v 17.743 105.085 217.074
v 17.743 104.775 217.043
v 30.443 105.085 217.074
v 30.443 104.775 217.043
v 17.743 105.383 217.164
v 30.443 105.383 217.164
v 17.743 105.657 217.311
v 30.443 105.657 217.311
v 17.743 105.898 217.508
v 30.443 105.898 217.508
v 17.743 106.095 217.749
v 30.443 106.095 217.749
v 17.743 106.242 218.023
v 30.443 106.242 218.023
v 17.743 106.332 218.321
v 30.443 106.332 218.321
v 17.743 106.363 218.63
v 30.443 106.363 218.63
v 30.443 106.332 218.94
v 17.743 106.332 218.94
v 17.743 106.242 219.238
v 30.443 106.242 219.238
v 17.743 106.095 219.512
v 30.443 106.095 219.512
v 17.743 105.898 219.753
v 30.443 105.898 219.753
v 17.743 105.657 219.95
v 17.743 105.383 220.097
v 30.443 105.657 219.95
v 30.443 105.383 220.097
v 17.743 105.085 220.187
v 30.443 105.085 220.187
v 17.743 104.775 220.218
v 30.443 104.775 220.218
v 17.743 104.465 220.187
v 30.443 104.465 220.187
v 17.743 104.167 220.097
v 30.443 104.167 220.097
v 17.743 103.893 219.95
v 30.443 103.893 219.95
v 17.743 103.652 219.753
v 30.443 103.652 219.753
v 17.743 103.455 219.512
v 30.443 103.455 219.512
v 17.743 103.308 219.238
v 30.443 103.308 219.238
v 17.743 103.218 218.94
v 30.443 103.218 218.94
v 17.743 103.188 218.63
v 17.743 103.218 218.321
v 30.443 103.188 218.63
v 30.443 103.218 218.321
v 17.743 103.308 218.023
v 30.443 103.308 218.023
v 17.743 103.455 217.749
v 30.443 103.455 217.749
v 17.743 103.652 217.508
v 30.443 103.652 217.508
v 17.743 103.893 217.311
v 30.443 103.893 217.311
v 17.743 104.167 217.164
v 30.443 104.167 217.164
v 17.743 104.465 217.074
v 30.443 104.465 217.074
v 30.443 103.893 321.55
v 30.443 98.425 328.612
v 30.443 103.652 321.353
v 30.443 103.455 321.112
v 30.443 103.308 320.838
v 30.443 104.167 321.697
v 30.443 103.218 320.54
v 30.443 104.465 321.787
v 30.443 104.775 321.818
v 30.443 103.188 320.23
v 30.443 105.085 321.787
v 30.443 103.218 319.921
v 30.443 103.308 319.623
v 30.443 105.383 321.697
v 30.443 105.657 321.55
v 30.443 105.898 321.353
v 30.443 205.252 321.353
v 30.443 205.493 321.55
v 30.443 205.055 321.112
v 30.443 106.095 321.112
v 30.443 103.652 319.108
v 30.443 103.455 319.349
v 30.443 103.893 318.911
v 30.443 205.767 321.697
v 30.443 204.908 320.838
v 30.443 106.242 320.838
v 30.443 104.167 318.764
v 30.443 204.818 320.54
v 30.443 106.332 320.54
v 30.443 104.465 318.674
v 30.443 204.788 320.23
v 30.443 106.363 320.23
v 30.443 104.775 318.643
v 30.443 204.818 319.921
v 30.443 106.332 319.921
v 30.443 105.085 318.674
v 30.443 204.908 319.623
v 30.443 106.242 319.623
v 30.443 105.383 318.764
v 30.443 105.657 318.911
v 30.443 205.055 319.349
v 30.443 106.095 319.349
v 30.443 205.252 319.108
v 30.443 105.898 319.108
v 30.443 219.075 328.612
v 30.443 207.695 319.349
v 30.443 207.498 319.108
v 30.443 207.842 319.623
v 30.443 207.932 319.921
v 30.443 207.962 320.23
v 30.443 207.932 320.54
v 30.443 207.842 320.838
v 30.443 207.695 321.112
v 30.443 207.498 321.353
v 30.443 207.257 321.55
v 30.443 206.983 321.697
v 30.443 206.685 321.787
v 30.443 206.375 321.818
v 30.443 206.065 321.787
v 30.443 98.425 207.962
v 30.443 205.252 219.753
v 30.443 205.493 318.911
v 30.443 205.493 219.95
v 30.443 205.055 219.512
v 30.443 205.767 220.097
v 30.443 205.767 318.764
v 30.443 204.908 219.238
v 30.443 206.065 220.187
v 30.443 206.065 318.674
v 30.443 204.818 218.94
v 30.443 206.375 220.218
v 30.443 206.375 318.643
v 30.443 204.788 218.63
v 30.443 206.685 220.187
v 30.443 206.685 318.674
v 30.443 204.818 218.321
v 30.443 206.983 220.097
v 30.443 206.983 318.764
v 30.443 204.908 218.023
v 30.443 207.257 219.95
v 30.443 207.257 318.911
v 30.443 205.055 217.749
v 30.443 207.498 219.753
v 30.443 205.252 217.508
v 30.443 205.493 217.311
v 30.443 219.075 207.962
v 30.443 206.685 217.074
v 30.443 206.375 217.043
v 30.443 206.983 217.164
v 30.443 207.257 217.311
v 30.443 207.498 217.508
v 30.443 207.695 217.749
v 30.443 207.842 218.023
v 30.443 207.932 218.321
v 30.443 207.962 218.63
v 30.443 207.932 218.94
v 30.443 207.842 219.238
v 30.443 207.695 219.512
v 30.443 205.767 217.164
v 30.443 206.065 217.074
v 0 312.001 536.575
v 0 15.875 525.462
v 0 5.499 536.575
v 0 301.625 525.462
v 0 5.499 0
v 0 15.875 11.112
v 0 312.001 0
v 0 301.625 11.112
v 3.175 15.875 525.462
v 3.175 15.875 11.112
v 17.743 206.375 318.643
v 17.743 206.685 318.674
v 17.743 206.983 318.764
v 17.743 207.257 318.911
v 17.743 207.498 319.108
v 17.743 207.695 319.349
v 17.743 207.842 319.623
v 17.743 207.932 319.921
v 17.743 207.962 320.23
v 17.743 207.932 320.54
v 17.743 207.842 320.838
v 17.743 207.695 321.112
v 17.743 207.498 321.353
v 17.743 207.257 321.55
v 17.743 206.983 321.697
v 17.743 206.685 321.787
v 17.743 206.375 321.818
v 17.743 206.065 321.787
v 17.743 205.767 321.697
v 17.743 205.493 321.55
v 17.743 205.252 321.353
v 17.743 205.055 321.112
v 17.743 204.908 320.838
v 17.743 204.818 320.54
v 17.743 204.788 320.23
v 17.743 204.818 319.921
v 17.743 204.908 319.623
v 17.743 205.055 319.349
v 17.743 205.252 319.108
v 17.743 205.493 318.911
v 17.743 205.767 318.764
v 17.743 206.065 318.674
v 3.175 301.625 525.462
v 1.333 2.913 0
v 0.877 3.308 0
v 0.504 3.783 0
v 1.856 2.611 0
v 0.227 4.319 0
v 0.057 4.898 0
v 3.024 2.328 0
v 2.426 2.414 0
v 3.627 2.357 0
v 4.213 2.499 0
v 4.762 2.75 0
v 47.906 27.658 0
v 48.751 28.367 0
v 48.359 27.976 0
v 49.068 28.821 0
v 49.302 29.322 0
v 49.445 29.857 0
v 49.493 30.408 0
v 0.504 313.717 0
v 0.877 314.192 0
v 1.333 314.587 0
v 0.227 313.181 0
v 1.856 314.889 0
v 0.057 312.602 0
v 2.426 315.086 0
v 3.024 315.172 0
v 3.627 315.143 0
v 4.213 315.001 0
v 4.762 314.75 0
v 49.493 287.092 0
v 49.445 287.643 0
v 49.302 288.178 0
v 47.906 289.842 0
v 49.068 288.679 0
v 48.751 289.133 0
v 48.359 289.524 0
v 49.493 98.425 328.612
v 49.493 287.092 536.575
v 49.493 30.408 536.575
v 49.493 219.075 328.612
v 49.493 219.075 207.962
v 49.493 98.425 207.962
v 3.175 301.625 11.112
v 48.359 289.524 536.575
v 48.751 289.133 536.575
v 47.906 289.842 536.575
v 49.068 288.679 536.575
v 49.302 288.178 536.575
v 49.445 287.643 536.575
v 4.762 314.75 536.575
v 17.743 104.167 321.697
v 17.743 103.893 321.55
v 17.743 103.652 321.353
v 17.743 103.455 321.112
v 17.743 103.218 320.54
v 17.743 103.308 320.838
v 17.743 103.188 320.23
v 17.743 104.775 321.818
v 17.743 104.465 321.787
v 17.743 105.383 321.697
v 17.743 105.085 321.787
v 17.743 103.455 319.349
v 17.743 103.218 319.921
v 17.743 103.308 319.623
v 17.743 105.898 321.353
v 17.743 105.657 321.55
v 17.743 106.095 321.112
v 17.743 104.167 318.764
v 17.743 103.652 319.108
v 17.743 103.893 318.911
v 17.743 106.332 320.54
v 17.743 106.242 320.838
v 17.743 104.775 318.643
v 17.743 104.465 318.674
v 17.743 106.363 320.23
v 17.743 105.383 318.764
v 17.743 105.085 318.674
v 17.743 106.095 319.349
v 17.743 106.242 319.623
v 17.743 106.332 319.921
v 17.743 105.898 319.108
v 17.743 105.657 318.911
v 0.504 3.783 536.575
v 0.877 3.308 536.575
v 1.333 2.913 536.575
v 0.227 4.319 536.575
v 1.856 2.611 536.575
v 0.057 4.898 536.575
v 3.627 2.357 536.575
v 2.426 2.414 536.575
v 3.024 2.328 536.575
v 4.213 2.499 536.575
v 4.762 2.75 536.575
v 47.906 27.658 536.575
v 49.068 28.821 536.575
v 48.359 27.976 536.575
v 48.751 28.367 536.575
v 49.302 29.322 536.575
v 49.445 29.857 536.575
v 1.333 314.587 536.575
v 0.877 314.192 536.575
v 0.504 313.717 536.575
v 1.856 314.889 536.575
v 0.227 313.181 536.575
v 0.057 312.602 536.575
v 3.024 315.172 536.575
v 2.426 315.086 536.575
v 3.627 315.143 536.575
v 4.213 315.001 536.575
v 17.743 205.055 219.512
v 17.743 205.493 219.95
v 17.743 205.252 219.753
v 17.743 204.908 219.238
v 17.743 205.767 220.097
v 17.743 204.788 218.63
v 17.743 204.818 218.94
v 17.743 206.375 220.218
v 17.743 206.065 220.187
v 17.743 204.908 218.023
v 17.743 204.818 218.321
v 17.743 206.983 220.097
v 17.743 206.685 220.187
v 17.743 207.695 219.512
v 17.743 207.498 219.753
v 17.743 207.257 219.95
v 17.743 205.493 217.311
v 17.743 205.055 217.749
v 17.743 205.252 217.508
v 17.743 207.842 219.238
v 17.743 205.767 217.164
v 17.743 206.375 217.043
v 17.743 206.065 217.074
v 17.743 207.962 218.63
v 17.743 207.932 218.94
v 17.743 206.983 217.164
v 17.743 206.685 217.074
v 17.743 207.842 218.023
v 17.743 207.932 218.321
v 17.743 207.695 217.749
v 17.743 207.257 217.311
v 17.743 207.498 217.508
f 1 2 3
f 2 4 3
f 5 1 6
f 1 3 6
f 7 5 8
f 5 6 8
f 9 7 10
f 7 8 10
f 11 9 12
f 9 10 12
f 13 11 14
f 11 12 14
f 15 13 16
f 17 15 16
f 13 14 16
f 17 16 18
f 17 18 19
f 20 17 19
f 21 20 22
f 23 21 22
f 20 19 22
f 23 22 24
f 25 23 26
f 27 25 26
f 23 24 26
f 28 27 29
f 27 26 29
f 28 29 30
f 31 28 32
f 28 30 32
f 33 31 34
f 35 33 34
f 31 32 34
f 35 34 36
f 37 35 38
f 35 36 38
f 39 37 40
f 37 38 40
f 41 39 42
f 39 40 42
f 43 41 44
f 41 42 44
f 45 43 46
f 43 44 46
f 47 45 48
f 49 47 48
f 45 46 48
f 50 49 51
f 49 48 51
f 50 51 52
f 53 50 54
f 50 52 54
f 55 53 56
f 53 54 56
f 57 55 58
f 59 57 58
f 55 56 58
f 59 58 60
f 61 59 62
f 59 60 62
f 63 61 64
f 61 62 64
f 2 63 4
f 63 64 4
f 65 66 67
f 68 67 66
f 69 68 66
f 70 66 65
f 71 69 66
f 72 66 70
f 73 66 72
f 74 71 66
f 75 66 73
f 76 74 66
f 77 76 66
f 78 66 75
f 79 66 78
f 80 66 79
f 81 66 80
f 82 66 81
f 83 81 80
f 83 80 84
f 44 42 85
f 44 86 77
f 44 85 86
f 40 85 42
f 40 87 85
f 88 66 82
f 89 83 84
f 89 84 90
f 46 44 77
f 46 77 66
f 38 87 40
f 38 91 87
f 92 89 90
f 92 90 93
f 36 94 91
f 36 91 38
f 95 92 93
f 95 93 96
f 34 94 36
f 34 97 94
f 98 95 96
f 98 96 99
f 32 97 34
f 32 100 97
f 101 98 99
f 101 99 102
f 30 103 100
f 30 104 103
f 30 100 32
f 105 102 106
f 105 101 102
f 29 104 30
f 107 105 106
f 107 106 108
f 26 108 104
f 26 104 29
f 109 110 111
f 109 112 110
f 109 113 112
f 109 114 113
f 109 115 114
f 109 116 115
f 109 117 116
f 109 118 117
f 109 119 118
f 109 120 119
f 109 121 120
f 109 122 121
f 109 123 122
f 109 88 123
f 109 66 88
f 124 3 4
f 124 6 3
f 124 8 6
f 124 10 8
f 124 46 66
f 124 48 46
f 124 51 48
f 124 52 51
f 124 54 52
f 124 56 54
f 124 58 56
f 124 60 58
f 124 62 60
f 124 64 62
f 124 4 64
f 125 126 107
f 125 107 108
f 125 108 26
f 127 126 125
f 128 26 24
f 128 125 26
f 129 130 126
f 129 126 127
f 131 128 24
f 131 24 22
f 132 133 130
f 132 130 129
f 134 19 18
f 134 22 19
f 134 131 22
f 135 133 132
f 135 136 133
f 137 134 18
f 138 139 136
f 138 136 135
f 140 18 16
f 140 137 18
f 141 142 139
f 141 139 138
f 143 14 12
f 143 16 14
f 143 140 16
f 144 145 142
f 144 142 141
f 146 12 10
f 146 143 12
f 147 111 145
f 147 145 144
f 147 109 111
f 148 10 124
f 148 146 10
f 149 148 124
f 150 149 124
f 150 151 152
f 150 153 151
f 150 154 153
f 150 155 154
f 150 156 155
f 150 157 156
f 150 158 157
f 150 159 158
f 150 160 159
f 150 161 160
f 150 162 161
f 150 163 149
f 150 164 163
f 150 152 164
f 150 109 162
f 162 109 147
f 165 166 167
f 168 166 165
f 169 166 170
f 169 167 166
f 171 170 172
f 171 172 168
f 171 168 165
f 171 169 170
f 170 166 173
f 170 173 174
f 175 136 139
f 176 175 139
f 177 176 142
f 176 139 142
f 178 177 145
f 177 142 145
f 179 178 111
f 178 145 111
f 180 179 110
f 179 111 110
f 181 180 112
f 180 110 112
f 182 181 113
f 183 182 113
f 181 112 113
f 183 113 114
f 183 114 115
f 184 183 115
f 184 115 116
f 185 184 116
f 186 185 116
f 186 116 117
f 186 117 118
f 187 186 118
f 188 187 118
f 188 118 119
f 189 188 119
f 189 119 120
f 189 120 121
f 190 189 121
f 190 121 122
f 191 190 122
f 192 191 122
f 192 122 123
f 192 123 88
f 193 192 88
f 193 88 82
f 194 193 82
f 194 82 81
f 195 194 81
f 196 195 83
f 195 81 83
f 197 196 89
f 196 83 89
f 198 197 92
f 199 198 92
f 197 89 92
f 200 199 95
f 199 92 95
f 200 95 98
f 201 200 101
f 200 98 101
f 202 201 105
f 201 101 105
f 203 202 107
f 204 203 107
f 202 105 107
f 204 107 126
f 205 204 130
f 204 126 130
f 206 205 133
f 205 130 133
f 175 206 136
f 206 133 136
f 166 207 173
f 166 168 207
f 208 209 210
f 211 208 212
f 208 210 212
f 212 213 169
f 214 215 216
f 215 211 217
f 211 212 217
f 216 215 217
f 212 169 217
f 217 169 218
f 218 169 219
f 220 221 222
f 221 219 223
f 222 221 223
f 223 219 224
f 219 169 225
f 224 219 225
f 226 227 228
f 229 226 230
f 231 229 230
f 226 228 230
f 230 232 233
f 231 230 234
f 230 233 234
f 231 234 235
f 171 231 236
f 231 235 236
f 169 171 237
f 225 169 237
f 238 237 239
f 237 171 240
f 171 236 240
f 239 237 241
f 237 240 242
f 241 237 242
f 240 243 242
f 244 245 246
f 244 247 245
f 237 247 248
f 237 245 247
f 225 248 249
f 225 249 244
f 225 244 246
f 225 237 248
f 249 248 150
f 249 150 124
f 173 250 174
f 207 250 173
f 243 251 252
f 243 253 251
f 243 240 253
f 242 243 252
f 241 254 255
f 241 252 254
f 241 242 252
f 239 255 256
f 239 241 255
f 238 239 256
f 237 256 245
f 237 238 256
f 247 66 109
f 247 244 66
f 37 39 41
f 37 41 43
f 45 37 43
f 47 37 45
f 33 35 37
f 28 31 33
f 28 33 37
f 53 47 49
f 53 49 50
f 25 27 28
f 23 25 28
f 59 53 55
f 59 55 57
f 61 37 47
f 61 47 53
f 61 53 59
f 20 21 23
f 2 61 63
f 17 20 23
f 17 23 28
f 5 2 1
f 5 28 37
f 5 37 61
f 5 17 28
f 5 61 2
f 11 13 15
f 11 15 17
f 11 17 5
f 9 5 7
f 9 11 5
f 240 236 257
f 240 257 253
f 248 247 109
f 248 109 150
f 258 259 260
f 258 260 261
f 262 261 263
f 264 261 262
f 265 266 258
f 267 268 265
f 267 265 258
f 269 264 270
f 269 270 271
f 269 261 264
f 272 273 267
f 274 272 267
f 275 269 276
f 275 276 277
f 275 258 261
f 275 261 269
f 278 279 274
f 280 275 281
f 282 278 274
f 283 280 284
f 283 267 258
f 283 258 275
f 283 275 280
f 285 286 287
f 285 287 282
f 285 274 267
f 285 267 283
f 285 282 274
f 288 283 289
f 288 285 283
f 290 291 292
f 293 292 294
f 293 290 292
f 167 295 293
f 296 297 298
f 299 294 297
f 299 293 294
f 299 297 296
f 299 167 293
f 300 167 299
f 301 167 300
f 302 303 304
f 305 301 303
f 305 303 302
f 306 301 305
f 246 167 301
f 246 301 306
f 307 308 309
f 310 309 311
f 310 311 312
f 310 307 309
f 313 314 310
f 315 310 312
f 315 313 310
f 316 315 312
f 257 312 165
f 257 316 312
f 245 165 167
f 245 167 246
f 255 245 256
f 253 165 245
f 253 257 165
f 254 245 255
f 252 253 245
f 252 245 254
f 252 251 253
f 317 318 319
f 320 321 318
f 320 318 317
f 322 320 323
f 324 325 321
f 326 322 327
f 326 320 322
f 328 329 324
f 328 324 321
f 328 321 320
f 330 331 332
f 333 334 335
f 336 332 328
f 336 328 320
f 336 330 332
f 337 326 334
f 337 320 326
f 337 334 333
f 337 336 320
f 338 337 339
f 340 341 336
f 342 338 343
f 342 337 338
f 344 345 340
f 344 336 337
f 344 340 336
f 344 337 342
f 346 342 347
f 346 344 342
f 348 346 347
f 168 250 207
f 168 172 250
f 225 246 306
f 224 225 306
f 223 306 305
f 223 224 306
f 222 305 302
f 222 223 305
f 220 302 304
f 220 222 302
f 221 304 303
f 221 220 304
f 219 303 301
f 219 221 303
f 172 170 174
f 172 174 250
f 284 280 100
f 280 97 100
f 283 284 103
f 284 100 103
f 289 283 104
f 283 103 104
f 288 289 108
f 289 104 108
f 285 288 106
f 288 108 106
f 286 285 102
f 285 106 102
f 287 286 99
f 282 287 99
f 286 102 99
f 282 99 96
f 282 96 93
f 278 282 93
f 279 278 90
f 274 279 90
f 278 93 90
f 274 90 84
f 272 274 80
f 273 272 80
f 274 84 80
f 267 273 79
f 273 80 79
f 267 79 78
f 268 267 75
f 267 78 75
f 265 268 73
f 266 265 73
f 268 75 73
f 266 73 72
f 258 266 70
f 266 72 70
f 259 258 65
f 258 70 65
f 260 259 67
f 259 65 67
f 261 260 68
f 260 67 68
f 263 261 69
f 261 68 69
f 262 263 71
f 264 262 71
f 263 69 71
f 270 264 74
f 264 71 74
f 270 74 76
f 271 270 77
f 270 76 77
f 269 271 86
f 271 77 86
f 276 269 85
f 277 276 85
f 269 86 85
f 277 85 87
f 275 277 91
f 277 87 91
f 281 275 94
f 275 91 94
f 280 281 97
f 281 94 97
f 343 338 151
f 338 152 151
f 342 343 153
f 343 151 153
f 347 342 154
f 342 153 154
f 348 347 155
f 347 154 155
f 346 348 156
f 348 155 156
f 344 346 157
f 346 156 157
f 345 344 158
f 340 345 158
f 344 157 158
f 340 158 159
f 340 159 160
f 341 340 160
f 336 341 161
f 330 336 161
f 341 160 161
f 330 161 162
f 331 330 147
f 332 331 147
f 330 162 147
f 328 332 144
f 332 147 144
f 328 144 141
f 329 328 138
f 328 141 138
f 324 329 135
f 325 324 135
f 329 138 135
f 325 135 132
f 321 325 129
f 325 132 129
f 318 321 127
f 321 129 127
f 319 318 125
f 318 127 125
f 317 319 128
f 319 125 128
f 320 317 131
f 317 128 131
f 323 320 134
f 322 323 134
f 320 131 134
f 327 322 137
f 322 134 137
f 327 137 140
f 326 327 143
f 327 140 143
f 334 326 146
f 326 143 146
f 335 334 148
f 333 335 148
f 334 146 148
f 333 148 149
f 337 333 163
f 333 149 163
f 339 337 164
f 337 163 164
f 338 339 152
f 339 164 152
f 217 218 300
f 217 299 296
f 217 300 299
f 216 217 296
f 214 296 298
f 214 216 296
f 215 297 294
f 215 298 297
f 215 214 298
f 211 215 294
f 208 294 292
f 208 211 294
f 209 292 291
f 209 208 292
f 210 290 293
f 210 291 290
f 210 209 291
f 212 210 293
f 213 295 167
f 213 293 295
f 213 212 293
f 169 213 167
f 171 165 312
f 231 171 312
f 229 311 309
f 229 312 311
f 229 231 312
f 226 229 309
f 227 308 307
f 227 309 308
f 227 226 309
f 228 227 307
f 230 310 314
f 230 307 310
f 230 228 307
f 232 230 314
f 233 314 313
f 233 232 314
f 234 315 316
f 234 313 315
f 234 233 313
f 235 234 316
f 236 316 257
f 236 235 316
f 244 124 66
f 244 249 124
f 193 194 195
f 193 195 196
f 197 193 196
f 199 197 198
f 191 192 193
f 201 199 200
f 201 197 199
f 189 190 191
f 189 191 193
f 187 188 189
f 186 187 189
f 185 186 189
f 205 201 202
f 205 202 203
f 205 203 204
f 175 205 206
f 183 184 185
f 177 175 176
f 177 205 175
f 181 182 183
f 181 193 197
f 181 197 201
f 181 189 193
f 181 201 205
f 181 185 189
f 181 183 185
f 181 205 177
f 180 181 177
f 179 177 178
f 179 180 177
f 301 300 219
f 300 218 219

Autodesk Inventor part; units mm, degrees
ref_plane "YZ Plane" through (0, 0, 0) normal (1, 0, 0) x (0, 1, 0)
ref_plane "XZ Plane" through (0, 0, 0) normal (0, 1, 0) x (-1, 0, 0)
ref_plane "XY Plane" through (0, 0, 0) normal (0, 0, 1) x (1, 0, 0)
sketch "Sketch1" plane through (0, 0, 0) normal (0, 0, 1) x (1, 0, 0)
  line L0 (0, 5.4993) -> (0, 312.0007)
  line L1 (4.7625, 314.7504) -> (47.9059, 289.8415)
  line L2 (0, 158.75) -> (212.725, 158.75) construction
  line L3 (4.7625, 2.7496) -> (47.9059, 27.6585)
  line L4 (49.4934, 287.0919) -> (49.4934, 30.4081)
  arc A0 (49.4934, 287.0919) -> (47.9059, 289.8415) centre (46.3184, 287.0919) ccw
  arc A1 (47.9059, 27.6585) -> (49.4934, 30.4081) centre (46.3184, 30.4081) ccw
  arc A2 (0, 5.4993) -> (4.7625, 2.7496) centre (3.175, 5.4993) ccw
  arc A3 (4.7625, 314.7504) -> (0, 312.0007) centre (3.175, 312.0007) ccw
  point P0 (0, 0)
  point P1 (0, 317.5)
  point P2 (49.4934, 288.925)
  point P3 (49.4934, 28.575)
  dimension "d0" = 317.5
  dimension "d1" = 57.15
  dimension "d2" = 60
  dimension "d3" = 3.175
  dimension "d4" = 3.175
extrude "Extrusion1" add sketch "Sketch1" along normal blind 536.575
sketch "Sketch4" plane through (49.4934, 30.4081, 0) normal (1, 0, 0) x (0, 0, -1)
  line L0 (-536.575, 0) -> (-536.575, 256.6838) construction
  line L1 (-536.575, 128.3419) -> (0, 128.3419) construction
  line L2 (0, 0) -> (0, 256.6838) construction
  line L3 (0, 256.6838) -> (-536.575, 256.6838) construction
  line L4 (-268.2875, 256.6838) -> (-268.2875, 0) construction
  line L5 (0, 0) -> (-536.575, 0) construction
  line L6 (-328.6125, 188.6669) -> (-207.9625, 188.6669)
  line L7 (-207.9625, 188.6669) -> (-207.9625, 68.0169)
  line L8 (-207.9625, 68.0169) -> (-328.6125, 68.0169)
  line L9 (-328.6125, 68.0169) -> (-328.6125, 188.6669)
  line L10 (-328.6125, 188.6669) -> (-207.9625, 68.0169) construction
  line L11 (-207.9625, 188.6669) -> (-328.6125, 68.0169) construction
  point P0 (0, -30.4081)
  point P1 (-268.2875, 128.3419)
  dimension "d9" = 120.65
  dimension "d10" = 120.65
extrude "Extrusion2" cut sketch "Sketch4" against normal blind 19.05
sketch "Sketch5" plane through (30.4434, 30.4081, 0) normal (1, 0, 0) x (0, 0, -1)
  circle A0 centre (-218.6305, 175.9669) radius 1.5875
  circle A1 centre (-320.2305, 175.9669) radius 1.5875
  circle A2 centre (-218.6305, 74.3669) radius 1.5875
  circle A3 centre (-320.2305, 74.3669) radius 1.5875
  line L0 (-328.6125, 68.0169) -> (-328.6125, 188.6669) projected
  line L1 (-207.9625, 68.0169) -> (-328.6125, 68.0169) projected
  line L2 (-320.2305, 175.9669) -> (-218.6305, 175.9669) construction
  line L3 (-218.6305, 175.9669) -> (-218.6305, 74.3669) construction
  line L4 (-218.6305, 74.3669) -> (-320.2305, 74.3669) construction
  line L5 (-320.2305, 74.3669) -> (-320.2305, 175.9669) construction
  point P0 (0, -30.4081)
  dimension "d13" = 3.175
  dimension "d14" = 3.175
  dimension "d15" = 3.175
  dimension "d16" = 101.6
  dimension "d17" = 101.6
  dimension "d18" = 101.6
  dimension "d19" = 8.382
  dimension "d20" = 8.382
  dimension "d21" = 107.95
extrude "Extrusion3" cut sketch "Sketch5" against normal blind 12.7
sketch "Sketch6" plane through (0, 5.4993, 0) normal (-1, 0, 0) x (0, 0, 1)
  line L0 (0, 306.5015) -> (0, 0) construction
  line L1 (0, 153.2507) -> (536.575, 153.2507) construction
  line L2 (536.575, 24.9088) -> (536.575, 281.5927) construction
  line L3 (0, 309.6765) -> (536.575, 309.6765) construction
  line L4 (0, 0) -> (536.575, 0) construction
  line L5 (0, -3.175) -> (536.575, -3.175) construction
  line L6 (268.2875, -3.175) -> (268.2875, 309.6765) construction
  line L7 (11.1125, 296.1257) -> (525.4625, 296.1257)
  line L8 (525.4625, 296.1257) -> (525.4625, 10.3757)
  line L9 (525.4625, 10.3757) -> (11.1125, 10.3757)
  line L10 (11.1125, 10.3757) -> (11.1125, 296.1257)
  line L11 (11.1125, 296.1257) -> (525.4625, 10.3757) construction
  line L12 (525.4625, 296.1257) -> (11.1125, 10.3757) construction
  point P0 (0, -5.4993)
  point P1 (268.2875, 153.2507)
  dimension "d24" = 285.75
extrude "Extrusion4" cut sketch "Sketch6" against normal blind 3.175
properties part number "Monitor v1.0"
